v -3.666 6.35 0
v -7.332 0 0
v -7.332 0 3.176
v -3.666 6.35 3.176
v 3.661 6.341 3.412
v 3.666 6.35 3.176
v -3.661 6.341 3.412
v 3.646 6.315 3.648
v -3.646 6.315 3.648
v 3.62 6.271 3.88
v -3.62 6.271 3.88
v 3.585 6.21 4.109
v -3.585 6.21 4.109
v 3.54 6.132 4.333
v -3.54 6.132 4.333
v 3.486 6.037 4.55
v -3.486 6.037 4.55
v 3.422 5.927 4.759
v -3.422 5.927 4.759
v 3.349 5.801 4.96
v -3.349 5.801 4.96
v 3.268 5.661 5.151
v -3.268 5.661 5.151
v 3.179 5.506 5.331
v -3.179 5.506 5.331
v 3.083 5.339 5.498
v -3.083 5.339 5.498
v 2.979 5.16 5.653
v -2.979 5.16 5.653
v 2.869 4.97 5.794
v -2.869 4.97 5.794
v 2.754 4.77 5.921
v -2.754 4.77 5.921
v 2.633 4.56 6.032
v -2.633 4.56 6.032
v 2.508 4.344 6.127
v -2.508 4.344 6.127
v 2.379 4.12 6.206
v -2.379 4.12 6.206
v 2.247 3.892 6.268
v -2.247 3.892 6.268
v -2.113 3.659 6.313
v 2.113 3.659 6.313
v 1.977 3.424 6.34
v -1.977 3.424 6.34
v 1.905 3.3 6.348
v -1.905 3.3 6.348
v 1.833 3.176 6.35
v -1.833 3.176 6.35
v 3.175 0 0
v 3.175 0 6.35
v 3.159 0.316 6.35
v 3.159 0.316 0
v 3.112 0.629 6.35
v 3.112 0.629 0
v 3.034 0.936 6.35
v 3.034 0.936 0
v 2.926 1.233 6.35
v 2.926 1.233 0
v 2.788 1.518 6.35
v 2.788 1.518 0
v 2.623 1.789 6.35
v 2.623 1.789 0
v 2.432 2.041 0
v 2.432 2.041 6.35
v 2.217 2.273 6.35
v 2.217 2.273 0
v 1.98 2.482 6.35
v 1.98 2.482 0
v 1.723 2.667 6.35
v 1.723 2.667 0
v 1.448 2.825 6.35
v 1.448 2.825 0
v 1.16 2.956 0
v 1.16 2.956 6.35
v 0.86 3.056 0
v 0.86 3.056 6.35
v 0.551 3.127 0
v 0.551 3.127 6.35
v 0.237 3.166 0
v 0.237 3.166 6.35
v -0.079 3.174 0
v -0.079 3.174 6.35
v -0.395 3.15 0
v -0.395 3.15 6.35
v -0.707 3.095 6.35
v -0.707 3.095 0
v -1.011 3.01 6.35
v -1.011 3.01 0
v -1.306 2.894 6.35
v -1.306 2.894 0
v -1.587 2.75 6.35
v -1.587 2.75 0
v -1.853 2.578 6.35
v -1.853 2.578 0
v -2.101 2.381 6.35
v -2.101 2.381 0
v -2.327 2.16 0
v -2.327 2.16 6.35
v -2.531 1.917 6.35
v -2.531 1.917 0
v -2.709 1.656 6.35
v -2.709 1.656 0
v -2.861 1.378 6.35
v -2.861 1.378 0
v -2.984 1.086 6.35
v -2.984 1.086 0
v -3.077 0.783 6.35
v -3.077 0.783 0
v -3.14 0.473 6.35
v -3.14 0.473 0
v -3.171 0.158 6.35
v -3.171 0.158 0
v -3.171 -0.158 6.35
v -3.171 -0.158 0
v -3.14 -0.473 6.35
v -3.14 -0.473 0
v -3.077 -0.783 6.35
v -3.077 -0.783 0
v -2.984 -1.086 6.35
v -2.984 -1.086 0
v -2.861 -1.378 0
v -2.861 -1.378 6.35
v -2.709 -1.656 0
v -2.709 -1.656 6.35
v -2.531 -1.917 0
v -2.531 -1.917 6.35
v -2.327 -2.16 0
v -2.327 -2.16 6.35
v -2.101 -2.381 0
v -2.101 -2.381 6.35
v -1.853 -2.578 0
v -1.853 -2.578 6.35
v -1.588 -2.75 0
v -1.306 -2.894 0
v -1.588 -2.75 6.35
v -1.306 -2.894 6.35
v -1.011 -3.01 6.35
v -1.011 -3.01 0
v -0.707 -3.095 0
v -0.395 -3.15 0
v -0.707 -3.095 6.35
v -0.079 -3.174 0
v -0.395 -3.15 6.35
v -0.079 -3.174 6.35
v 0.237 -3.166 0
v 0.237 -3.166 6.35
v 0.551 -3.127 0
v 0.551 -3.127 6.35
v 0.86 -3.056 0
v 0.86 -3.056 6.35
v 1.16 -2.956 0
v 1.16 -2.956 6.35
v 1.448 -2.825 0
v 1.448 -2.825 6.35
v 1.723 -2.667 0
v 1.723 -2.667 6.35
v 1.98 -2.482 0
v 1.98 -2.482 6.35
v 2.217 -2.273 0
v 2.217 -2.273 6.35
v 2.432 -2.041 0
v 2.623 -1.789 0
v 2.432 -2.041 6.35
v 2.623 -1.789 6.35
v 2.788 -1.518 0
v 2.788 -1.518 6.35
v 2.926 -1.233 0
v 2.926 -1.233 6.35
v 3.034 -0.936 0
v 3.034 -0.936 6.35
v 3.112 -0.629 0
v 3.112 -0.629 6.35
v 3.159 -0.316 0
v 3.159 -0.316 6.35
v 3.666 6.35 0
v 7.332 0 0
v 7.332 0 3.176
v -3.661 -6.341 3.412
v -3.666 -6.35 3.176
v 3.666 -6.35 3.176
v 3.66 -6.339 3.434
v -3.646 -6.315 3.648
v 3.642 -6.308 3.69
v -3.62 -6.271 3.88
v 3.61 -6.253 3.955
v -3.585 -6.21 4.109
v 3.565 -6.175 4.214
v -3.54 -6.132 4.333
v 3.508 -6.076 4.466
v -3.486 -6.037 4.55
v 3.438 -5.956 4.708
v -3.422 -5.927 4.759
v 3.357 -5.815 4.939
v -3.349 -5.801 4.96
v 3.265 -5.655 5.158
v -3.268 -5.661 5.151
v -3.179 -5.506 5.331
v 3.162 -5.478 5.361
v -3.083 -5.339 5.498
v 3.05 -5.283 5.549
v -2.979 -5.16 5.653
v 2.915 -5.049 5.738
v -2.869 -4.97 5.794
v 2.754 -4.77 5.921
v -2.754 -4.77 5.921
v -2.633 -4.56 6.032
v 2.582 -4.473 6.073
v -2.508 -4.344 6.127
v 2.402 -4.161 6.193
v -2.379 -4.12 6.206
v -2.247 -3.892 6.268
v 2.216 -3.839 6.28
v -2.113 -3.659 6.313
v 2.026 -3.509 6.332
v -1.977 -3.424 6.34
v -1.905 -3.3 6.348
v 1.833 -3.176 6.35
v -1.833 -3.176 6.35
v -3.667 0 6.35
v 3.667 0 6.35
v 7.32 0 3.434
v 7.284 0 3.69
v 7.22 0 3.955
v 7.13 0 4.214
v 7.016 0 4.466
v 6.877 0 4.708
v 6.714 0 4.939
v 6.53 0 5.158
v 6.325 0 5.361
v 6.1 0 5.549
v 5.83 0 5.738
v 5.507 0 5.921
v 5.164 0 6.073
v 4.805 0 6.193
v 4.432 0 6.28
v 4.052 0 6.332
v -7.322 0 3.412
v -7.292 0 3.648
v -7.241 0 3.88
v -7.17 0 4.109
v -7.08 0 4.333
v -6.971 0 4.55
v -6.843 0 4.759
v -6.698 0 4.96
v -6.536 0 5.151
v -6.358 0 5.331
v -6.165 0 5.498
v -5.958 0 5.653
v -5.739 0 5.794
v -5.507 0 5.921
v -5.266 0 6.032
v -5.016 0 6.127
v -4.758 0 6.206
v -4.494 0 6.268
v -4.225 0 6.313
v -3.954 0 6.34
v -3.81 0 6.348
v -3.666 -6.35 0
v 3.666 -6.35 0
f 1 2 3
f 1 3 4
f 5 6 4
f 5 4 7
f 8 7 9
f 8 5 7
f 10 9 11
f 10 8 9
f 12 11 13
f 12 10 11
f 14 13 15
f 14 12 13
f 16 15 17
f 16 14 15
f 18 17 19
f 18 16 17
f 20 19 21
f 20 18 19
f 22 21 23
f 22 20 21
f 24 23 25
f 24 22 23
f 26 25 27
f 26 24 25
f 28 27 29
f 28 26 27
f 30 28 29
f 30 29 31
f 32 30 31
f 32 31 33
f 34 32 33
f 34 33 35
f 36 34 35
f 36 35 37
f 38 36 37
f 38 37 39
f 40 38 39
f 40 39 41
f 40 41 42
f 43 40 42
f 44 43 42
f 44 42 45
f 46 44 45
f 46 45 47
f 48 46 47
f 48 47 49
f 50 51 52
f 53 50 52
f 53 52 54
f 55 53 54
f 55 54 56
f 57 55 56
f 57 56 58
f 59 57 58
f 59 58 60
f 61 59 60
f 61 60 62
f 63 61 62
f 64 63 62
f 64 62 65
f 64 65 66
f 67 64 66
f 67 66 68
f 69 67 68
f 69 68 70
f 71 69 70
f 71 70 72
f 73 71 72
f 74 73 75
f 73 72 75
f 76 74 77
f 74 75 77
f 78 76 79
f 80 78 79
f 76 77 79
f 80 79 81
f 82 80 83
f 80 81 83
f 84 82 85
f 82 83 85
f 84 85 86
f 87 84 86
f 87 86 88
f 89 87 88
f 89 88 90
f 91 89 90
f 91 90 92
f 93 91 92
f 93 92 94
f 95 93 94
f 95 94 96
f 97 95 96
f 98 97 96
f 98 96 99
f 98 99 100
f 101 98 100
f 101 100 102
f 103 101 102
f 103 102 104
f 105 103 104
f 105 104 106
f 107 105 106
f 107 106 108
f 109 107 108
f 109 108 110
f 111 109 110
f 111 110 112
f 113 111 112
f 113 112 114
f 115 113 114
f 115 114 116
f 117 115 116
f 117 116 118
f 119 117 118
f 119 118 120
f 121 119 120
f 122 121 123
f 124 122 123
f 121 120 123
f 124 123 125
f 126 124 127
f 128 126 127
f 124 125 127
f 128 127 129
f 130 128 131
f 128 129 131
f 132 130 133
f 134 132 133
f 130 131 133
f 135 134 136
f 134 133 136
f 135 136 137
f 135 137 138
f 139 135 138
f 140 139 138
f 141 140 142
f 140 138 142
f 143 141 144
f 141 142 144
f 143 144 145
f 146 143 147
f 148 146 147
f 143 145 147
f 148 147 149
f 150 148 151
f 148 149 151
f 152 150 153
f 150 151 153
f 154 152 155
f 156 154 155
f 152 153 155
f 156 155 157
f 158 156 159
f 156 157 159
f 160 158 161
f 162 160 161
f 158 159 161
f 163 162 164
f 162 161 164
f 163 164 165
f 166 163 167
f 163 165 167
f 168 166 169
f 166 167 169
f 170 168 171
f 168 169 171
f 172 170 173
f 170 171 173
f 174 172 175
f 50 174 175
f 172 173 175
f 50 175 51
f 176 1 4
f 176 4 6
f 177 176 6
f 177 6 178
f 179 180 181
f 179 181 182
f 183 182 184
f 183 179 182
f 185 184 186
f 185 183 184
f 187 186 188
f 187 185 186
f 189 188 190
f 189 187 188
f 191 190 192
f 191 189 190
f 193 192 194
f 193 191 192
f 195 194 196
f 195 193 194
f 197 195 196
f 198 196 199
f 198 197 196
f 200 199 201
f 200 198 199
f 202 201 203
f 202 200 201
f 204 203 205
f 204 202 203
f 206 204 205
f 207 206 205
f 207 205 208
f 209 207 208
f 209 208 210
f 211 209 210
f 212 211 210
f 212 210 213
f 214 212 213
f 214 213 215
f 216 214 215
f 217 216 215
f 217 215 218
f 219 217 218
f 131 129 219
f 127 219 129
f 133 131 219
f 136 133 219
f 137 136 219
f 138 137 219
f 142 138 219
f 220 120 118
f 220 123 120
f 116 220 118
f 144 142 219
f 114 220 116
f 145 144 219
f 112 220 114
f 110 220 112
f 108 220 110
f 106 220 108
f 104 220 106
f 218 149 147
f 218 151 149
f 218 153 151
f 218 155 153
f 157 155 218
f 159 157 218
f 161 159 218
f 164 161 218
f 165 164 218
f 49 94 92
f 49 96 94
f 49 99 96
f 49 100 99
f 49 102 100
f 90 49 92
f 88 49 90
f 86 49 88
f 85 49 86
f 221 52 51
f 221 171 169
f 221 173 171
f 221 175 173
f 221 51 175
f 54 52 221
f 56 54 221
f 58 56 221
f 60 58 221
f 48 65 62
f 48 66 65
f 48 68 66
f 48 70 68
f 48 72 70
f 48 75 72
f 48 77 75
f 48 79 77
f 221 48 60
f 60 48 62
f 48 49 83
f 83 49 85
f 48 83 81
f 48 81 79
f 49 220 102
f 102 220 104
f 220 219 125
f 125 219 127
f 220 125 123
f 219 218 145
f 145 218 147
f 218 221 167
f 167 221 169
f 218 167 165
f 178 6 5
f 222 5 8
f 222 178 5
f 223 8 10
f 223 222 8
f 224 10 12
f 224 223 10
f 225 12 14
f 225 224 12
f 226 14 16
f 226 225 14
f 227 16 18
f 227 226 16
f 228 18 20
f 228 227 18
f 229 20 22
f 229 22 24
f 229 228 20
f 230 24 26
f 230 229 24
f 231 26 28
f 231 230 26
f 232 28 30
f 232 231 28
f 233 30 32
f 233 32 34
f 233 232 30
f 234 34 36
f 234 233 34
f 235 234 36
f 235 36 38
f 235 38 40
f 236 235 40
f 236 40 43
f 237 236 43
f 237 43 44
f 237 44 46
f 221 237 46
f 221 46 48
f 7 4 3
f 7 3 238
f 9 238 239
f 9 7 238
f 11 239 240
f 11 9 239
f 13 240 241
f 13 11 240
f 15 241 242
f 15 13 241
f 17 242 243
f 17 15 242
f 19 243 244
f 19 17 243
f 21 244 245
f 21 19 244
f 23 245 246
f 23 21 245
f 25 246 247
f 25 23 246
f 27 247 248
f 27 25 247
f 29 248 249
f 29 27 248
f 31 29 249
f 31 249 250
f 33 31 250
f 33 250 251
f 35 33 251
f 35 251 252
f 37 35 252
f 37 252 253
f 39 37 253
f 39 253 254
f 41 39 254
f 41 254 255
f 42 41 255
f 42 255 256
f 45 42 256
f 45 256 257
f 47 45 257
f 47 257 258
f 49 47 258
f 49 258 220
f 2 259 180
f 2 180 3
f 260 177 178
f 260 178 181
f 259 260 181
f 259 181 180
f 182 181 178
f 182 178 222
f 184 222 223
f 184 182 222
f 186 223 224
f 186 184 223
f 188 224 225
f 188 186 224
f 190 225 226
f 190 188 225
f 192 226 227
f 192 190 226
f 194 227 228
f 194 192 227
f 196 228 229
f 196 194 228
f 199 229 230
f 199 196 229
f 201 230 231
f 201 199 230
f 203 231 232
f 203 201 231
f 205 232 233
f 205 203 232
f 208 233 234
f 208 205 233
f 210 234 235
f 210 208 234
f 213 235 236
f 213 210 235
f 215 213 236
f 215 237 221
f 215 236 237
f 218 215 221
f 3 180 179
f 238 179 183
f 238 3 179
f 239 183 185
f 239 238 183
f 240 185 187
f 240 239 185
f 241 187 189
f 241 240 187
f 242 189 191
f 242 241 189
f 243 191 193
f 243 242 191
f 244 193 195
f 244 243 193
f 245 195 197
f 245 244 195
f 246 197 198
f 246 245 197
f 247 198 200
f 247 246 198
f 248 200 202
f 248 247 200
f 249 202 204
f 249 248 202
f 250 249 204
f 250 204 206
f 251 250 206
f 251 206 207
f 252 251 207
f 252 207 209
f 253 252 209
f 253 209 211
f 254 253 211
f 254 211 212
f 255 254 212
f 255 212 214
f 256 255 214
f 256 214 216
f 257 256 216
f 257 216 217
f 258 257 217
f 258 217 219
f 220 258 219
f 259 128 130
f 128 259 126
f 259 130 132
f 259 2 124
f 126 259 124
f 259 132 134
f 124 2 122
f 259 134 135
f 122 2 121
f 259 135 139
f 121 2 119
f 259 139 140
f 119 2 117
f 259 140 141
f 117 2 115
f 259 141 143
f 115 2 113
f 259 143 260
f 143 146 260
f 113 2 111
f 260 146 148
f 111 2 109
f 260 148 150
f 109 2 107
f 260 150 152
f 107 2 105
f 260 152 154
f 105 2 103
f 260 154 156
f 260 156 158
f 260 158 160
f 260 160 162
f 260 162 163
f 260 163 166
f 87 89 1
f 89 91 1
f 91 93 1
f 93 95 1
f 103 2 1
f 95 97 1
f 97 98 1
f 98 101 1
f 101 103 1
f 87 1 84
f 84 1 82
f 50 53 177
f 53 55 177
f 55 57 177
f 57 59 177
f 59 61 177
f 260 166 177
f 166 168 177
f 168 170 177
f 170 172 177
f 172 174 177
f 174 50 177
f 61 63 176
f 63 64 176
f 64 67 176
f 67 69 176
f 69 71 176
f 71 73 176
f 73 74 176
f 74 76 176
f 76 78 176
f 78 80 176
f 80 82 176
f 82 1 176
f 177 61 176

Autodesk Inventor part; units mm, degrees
ref_plane "YZ Plane" through (0, 0, 0) normal (1, 0, 0) x (0, 1, 0)
ref_plane "XZ Plane" through (0, 0, 0) normal (0, 1, 0) x (-1, 0, 0)
ref_plane "XY Plane" through (0, 0, 0) normal (0, 0, 1) x (1, 0, 0)
sketch "Sketch1" plane through (0, 0, 0) normal (0, 0, 1) x (1, 0, 0)
  line L0 (-7.3323, 0) -> (-3.6662, 6.35)
  line L1 (-3.6662, 6.35) -> (3.6662, 6.35)
  line L2 (3.6662, 6.35) -> (7.3323, 0)
  line L3 (7.3323, 0) -> (3.6662, -6.35)
  line L4 (3.6662, -6.35) -> (-3.6662, -6.35)
  line L5 (-3.6662, -6.35) -> (-7.3323, 0)
  point P0 (0, 0)
  point P1 (0, 0)
  dimension "d0" = 12.7
extrude "Extrusion1" add sketch "Sketch1" along normal blind 6.35
sketch "Sketch2" plane through (0, 0, 6.35) normal (0, 0, 1) x (1, 0, 0)
  circle A0 centre (0, 0) radius 3.175
  dimension "d3" = 6.35
extrude "Extrusion2" cut sketch "Sketch2" against normal blind 6.35
thread "Thread1" size "1/4-20 UNC" class "2B" standard "ANSI Unified Screw Threads" full length
fillet "Fillet1" radius 3.175 6 edges at (0, 6.35, 6.35) (5.4993, 3.175, 6.35) (-5.4993, 3.175, 6.35) (-5.4993, -3.175, 6.35) (0, -6.35, 6.35) (5.4993, -3.175, 6.35)
properties part number "LucasCharles Part 8 small nut Final" material "Stainless Steel, Austenitic"
